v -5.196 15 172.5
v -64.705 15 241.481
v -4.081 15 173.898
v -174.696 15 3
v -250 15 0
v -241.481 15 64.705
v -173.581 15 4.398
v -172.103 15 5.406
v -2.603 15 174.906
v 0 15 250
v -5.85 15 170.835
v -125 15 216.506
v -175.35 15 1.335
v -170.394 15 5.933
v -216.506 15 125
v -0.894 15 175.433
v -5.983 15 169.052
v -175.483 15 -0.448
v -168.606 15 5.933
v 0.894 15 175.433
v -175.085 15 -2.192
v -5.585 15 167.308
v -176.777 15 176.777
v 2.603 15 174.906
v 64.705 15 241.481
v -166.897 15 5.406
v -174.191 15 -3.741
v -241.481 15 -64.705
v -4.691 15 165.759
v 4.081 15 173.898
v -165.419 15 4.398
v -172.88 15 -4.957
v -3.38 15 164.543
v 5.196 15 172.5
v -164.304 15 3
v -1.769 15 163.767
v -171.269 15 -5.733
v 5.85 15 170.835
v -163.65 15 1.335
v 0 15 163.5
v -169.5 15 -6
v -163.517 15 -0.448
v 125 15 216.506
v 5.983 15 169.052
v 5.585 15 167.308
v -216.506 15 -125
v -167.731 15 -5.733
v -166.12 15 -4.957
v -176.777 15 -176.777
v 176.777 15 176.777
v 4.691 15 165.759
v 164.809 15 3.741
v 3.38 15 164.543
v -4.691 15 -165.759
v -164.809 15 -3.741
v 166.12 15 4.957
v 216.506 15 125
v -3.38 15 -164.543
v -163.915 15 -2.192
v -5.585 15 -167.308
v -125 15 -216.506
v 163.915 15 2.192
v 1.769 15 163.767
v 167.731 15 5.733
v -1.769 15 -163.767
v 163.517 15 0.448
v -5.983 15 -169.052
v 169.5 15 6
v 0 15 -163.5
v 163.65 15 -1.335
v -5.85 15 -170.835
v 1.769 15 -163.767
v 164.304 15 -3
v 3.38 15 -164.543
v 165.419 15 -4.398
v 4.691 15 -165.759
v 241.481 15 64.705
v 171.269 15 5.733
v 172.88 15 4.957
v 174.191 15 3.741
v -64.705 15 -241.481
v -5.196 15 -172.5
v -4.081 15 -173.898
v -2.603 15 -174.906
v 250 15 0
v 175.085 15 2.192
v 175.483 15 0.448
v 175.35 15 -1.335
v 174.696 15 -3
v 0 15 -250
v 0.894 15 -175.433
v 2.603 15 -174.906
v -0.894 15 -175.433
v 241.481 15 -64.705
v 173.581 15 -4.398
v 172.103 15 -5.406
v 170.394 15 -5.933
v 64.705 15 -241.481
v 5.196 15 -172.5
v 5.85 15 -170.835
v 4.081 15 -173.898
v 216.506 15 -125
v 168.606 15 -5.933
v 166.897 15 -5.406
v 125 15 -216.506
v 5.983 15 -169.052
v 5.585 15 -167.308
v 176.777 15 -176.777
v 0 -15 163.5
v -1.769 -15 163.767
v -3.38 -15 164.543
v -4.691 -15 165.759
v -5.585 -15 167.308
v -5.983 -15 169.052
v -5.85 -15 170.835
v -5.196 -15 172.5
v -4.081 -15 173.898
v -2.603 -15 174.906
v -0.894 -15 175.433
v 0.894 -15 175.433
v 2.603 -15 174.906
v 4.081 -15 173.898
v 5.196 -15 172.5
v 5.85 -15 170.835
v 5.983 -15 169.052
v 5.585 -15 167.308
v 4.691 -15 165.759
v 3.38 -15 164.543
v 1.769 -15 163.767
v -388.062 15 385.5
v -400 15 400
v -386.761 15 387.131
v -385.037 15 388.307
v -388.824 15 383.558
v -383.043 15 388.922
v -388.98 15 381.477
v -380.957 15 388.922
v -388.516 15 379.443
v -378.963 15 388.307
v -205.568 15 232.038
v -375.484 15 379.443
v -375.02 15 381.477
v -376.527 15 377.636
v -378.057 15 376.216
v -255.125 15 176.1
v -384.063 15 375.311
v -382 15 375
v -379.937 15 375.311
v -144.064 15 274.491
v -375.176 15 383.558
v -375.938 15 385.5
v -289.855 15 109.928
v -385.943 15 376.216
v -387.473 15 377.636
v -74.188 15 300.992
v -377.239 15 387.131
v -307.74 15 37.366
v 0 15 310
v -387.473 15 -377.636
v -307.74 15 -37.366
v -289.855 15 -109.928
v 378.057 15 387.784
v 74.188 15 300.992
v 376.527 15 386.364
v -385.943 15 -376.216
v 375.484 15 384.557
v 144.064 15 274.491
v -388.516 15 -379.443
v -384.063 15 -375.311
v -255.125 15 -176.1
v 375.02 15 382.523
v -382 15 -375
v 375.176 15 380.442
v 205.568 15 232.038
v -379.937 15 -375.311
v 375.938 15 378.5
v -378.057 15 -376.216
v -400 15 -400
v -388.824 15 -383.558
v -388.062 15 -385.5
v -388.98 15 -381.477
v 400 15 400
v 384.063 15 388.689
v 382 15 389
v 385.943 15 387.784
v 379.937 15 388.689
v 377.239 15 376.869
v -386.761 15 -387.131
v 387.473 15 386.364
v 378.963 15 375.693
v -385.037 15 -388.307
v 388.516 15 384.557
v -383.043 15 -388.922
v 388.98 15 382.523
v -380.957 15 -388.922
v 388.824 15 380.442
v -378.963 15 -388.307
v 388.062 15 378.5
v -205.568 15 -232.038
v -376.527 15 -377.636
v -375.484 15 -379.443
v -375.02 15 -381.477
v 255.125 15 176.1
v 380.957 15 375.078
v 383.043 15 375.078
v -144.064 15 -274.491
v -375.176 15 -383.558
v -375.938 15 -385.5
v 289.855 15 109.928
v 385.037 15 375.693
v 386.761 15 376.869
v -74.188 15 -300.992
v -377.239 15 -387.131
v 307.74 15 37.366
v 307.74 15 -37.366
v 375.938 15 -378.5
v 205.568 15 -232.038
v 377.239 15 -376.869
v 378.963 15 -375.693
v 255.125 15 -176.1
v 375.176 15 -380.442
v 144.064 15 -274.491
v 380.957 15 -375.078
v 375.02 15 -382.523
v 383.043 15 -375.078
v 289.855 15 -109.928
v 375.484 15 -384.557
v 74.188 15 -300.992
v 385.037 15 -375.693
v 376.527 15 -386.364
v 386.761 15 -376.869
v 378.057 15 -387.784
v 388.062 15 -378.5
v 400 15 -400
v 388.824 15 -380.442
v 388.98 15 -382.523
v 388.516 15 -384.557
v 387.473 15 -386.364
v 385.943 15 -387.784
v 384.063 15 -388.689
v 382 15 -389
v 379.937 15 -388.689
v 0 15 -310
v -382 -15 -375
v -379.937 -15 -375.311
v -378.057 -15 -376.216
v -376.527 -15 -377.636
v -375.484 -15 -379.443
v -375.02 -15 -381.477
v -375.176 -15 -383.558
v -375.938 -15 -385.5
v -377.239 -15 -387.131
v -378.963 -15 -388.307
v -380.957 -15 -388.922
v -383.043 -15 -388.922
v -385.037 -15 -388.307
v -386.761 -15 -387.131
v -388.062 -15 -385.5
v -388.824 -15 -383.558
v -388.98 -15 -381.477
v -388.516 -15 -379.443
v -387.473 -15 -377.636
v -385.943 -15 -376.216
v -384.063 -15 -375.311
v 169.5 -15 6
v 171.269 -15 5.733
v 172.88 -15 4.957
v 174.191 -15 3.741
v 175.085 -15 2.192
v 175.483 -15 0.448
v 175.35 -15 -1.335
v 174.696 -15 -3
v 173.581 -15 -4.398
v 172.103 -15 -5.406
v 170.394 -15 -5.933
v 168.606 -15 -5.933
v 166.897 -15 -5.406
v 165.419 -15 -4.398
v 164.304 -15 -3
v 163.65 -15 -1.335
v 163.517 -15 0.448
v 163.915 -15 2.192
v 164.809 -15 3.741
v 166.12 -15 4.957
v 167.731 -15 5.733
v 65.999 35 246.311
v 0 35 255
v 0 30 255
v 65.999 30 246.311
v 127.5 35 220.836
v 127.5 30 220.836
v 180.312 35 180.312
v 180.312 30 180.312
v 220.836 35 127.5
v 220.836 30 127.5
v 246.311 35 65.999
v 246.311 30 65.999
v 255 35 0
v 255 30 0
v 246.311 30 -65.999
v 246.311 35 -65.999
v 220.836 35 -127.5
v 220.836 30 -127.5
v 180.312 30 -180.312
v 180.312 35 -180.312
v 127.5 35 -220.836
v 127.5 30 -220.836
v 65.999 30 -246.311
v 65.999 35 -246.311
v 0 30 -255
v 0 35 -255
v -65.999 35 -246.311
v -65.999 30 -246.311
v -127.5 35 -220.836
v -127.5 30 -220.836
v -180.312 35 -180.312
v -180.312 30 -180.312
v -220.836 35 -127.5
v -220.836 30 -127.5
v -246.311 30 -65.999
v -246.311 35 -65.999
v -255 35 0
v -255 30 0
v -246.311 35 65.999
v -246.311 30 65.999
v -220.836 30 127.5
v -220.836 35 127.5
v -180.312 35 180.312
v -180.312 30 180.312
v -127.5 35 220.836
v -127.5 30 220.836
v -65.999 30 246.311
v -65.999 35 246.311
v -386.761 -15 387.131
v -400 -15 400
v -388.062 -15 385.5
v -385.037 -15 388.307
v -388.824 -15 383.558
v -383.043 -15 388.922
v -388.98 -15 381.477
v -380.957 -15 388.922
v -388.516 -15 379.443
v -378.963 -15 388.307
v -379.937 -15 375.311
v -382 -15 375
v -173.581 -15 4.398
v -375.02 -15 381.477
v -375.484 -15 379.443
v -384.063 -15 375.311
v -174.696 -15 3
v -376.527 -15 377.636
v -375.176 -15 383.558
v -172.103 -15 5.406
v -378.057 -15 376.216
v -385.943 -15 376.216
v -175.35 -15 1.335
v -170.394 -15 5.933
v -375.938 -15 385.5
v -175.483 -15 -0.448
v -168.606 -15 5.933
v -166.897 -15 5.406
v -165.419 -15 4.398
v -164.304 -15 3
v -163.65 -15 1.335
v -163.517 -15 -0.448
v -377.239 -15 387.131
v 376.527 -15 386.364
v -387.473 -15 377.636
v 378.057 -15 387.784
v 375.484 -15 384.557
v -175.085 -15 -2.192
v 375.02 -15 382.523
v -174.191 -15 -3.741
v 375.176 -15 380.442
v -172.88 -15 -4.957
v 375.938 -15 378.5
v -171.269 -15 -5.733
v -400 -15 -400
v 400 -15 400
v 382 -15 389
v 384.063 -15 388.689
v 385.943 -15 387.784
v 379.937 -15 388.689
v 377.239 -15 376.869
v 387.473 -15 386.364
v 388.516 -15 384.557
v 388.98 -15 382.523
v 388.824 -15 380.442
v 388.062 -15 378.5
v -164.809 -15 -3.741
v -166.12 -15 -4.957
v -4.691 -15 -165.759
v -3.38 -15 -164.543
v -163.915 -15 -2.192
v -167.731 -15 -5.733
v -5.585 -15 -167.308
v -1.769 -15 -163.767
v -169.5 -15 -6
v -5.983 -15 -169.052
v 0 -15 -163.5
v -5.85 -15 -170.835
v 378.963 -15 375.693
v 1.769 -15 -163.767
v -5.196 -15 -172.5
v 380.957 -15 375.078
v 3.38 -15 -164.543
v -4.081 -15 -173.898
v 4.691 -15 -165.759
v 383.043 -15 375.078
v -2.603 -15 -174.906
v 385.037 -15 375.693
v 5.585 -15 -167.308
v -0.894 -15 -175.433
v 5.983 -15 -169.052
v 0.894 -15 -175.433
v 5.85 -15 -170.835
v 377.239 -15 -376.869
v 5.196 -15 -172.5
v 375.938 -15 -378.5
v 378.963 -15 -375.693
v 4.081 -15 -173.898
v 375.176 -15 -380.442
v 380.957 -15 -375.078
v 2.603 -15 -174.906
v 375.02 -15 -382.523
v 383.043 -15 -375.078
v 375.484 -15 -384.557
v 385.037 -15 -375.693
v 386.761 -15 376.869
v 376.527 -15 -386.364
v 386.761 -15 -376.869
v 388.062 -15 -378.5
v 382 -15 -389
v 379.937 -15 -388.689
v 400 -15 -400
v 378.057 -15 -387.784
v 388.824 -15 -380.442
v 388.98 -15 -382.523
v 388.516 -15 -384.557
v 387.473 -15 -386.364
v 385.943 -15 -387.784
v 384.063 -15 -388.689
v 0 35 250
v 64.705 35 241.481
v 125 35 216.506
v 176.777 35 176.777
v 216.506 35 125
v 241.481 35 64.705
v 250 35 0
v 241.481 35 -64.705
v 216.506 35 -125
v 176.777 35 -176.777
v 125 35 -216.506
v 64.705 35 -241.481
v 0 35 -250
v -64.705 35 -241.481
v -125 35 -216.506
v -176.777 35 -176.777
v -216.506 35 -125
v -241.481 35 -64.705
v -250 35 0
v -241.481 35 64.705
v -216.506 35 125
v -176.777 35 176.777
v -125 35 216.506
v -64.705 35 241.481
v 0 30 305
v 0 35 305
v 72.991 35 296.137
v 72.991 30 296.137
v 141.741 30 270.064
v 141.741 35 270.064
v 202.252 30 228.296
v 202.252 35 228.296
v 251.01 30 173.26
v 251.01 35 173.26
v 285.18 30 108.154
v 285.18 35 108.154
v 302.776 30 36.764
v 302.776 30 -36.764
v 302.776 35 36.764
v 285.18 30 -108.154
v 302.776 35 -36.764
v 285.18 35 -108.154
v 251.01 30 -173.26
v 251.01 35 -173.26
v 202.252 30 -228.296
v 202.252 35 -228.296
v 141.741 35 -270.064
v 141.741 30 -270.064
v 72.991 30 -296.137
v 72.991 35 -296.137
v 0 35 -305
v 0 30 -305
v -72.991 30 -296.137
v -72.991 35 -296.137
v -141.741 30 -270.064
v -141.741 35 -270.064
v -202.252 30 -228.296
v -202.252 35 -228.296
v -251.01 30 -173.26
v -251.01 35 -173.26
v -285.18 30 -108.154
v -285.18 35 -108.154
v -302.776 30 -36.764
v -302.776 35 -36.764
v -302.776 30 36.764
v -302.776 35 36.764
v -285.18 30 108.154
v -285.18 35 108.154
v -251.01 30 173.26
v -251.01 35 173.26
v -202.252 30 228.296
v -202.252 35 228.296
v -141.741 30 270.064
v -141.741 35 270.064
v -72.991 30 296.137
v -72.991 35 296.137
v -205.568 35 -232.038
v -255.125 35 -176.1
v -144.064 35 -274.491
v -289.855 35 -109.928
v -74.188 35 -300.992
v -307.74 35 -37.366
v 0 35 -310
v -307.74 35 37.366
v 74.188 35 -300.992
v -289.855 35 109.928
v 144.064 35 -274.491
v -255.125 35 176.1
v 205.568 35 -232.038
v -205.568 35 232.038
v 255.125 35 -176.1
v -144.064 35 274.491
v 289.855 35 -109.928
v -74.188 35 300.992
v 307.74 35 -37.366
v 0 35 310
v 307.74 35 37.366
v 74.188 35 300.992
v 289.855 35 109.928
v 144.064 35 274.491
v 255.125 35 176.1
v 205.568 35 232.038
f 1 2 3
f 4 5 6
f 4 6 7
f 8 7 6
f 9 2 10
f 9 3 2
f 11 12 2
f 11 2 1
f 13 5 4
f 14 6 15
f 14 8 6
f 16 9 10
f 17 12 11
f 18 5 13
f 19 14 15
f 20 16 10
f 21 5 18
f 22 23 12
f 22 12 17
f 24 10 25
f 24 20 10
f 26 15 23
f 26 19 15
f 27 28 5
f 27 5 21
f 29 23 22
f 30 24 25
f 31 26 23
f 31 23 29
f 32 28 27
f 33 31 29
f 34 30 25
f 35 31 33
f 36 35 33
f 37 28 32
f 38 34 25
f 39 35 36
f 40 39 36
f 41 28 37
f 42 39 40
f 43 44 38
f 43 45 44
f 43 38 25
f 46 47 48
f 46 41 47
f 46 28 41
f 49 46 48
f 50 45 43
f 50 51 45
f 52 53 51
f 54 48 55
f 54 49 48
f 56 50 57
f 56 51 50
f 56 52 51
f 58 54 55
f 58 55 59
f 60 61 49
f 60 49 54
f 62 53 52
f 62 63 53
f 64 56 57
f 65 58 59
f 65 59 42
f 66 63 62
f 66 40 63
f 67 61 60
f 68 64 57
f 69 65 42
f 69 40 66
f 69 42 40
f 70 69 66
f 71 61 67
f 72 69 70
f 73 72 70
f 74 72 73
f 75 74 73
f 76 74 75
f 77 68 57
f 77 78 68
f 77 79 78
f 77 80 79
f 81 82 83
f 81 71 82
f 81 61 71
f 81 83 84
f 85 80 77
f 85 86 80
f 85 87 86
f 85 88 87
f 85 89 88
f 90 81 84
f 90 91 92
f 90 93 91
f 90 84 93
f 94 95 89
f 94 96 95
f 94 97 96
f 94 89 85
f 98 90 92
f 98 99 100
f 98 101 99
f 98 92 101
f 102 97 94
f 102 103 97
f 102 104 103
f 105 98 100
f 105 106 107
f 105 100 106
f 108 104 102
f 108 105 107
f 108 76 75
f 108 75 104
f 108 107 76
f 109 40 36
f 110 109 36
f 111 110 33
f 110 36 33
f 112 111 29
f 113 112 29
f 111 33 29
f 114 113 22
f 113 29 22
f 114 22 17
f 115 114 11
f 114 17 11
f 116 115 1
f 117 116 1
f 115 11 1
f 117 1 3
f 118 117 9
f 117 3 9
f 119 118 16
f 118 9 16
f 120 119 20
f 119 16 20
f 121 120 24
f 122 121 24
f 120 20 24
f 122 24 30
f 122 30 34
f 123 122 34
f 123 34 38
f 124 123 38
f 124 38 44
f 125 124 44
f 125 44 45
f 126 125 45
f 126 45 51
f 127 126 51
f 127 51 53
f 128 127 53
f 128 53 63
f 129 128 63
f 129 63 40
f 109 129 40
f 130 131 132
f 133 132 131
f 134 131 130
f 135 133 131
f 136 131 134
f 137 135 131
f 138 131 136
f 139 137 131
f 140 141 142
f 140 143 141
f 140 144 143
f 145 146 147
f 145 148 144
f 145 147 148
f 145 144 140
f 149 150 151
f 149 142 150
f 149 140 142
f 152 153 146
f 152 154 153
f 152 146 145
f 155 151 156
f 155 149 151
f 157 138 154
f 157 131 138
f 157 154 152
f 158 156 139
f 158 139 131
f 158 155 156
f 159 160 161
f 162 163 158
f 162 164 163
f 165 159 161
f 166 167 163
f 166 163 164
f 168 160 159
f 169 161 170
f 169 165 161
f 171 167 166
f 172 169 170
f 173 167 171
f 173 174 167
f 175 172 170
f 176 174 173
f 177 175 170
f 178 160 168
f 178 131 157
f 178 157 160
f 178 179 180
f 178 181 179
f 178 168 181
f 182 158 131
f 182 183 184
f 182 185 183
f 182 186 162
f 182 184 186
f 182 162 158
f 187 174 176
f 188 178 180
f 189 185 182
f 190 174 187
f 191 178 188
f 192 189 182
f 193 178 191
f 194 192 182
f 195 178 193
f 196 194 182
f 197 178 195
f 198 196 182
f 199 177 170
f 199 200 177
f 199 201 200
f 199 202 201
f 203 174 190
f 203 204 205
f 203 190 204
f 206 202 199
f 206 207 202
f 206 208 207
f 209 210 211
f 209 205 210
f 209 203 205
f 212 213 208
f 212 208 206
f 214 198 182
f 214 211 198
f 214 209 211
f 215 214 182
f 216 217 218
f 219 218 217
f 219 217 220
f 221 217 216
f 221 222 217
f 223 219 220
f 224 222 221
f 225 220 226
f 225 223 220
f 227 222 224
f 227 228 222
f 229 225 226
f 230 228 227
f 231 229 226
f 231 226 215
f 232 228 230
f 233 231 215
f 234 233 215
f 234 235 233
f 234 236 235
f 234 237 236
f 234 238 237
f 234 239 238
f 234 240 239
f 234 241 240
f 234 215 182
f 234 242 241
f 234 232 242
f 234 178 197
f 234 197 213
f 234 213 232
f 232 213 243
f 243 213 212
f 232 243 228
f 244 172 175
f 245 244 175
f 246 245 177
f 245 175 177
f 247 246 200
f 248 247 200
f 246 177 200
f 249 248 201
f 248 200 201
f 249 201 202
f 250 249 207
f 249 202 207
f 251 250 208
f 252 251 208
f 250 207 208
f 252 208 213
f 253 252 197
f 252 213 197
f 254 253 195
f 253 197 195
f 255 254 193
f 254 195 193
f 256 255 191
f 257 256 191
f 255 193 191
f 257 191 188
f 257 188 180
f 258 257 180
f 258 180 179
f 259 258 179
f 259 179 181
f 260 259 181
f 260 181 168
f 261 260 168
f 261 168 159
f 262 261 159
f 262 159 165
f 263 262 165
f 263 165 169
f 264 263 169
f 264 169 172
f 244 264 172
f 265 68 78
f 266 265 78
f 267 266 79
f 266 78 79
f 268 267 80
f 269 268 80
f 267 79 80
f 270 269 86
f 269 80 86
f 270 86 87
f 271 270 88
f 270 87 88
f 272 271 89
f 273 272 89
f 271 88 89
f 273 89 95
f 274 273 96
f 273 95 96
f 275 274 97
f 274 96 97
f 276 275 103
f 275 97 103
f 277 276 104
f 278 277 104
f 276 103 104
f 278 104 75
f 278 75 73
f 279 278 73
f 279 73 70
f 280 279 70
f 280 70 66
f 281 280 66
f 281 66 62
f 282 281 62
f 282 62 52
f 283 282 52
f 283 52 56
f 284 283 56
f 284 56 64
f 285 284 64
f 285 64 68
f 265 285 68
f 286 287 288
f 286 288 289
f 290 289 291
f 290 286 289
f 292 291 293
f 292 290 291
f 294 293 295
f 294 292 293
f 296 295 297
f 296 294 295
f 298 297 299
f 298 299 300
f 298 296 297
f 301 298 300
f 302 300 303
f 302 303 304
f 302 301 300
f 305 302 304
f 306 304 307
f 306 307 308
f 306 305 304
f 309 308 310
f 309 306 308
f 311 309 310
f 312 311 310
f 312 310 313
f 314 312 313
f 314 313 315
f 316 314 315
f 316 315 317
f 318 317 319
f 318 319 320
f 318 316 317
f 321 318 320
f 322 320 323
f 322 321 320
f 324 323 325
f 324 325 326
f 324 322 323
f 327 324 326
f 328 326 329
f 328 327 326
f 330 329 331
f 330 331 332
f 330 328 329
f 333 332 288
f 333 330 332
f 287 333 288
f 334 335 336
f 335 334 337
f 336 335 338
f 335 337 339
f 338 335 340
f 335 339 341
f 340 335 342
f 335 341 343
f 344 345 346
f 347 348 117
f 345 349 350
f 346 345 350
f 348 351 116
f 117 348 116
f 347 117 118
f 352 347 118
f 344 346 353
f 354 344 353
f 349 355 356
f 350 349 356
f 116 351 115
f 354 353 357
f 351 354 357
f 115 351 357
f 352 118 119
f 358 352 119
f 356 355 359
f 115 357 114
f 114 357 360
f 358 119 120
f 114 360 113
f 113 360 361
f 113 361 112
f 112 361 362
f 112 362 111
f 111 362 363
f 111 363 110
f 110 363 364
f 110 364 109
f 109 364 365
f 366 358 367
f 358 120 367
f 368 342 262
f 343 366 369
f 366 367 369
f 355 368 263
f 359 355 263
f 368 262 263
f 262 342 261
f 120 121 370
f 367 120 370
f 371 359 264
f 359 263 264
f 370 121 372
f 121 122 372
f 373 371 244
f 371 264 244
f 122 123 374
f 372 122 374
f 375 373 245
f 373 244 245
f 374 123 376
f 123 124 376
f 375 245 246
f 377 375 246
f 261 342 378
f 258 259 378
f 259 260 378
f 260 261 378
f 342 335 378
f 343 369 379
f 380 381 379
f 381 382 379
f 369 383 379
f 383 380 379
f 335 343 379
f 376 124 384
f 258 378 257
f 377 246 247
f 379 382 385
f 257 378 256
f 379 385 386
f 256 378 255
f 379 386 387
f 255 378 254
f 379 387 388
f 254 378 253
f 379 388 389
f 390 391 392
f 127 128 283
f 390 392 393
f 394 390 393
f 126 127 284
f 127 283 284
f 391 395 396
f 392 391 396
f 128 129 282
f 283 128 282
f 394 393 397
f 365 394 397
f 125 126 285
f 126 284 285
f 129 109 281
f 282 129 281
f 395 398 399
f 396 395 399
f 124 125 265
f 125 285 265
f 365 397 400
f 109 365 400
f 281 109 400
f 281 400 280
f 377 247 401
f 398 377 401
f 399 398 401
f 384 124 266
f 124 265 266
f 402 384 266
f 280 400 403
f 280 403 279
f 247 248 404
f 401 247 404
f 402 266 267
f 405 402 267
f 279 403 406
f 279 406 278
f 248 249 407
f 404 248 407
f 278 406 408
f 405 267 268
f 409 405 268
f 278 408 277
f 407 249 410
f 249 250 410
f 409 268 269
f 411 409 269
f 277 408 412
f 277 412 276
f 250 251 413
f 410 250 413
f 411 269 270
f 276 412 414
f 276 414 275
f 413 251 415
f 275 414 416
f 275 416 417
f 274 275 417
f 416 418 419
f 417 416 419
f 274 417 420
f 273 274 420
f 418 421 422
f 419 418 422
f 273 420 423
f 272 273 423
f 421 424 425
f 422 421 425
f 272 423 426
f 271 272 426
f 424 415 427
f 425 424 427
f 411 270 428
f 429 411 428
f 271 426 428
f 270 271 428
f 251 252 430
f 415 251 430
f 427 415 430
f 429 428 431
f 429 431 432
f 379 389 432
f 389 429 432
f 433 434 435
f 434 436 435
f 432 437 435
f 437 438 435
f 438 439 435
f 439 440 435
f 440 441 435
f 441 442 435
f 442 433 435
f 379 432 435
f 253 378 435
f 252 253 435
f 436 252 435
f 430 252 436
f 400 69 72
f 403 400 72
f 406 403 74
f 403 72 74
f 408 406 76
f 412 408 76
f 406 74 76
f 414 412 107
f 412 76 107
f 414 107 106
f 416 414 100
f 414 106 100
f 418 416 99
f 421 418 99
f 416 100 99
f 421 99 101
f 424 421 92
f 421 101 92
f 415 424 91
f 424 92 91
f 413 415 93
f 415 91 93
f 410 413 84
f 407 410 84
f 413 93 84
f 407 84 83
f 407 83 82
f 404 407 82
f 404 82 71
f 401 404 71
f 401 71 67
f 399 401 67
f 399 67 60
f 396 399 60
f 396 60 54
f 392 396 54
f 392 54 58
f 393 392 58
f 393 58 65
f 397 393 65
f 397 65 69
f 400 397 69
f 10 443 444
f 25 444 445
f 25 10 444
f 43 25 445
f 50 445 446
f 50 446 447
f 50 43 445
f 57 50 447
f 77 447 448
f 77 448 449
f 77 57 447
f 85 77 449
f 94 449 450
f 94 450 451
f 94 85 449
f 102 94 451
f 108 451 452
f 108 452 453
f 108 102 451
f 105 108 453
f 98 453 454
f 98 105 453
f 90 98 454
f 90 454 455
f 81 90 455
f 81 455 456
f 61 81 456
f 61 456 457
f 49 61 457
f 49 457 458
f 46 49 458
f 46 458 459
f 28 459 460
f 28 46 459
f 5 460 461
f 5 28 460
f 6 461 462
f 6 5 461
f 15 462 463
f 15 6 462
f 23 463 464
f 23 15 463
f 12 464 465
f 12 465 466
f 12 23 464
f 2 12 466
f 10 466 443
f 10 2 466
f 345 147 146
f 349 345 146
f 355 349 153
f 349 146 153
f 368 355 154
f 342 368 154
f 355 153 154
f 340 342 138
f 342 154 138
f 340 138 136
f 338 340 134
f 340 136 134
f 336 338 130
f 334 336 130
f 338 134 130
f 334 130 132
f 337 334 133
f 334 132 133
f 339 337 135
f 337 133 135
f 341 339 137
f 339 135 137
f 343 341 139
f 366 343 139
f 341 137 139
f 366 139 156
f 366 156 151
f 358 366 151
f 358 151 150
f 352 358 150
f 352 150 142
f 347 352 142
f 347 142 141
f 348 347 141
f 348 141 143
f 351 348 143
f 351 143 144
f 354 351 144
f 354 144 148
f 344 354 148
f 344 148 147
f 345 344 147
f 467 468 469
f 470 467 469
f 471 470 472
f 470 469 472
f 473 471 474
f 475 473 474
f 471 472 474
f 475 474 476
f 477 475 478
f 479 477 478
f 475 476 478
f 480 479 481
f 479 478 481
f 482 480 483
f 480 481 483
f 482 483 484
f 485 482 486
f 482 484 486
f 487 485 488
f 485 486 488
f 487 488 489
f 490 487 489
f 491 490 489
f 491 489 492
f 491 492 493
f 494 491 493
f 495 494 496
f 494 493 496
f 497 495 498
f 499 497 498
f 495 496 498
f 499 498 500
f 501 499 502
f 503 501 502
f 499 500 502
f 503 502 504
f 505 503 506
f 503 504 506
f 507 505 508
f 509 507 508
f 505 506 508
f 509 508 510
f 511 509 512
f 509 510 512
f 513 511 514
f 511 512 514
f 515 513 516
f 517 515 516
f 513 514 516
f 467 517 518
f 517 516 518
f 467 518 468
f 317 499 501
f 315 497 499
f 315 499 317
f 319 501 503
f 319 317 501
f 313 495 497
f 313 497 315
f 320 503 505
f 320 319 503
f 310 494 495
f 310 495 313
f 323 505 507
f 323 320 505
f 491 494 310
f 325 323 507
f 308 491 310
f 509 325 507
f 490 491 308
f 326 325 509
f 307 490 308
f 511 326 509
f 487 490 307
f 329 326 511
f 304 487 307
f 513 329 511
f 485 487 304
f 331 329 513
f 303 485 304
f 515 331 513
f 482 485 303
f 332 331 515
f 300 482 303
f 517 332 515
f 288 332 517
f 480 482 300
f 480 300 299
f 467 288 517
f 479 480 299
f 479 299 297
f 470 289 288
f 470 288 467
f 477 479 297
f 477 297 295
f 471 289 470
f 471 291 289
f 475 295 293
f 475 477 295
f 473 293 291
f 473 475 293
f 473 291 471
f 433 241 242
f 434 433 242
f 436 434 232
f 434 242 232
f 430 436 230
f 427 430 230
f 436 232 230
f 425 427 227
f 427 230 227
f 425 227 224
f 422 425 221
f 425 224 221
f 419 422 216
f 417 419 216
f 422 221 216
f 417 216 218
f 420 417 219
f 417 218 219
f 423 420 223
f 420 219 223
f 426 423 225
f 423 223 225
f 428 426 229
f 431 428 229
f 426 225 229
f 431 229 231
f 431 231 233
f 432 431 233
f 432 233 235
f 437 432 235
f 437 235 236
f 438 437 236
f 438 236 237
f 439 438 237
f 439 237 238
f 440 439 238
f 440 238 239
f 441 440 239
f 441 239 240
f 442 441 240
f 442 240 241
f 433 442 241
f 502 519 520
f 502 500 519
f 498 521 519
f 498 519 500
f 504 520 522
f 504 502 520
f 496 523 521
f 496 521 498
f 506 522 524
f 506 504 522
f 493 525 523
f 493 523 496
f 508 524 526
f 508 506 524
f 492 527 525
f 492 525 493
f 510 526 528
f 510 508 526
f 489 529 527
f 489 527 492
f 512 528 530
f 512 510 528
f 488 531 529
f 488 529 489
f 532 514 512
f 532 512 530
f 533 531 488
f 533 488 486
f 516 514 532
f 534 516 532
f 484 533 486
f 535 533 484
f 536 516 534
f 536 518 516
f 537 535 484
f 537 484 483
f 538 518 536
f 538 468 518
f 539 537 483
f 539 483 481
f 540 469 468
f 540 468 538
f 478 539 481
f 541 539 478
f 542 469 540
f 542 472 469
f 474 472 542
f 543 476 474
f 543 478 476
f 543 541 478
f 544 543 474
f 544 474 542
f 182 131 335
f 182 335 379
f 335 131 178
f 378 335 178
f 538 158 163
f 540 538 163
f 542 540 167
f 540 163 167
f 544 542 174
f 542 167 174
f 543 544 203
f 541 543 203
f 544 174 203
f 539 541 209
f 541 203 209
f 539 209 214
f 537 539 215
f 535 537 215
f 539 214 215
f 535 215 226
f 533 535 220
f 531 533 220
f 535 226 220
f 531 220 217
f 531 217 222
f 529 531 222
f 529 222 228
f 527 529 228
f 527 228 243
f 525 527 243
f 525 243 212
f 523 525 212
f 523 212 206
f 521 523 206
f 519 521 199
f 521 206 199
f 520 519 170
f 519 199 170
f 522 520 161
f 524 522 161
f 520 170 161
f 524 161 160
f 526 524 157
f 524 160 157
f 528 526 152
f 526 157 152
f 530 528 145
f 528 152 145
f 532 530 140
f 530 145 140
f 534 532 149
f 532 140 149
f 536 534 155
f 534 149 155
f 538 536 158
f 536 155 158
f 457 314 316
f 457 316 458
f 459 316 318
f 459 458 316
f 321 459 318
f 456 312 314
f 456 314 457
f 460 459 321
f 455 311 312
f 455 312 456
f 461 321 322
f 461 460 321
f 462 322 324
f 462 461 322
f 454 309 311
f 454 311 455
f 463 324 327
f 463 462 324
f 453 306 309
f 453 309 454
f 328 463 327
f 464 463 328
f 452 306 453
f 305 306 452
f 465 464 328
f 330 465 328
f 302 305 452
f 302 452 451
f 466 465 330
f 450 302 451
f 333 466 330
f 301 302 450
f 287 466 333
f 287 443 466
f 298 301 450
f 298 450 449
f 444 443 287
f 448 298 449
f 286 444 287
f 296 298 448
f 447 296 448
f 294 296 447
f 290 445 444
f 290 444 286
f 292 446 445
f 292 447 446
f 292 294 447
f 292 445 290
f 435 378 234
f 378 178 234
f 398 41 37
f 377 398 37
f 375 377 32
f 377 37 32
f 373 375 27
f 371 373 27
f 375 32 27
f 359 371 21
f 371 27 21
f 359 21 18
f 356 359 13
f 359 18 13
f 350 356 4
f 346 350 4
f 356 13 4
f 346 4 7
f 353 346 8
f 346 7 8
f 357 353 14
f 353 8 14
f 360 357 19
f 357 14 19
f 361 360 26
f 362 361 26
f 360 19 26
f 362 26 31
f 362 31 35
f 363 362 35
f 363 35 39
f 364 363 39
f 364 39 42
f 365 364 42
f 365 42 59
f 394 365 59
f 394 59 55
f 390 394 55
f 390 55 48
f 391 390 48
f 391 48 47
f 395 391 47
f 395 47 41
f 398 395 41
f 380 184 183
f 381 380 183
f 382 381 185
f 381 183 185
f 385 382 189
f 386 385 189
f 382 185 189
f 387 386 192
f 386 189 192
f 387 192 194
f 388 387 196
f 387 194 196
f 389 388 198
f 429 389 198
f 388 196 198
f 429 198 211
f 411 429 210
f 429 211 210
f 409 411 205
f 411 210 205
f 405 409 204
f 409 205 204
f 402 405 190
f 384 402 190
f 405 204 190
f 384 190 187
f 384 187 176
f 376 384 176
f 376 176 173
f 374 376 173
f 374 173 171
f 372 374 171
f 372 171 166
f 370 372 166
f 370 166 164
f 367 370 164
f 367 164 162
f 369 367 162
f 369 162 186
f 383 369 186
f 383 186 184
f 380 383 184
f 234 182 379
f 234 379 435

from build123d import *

# Parameters (mm, degrees)
SKETCH1_W           = 800
SKETCH1_H           = 800
BOSS_EXTRUDE1_DEPTH = 15
SKETCH4_R           = 6
CUT_EXTRUDE3_DEPTH  = 567.480361531
SKETCH3_R           = 310
SKETCH3_R_2         = 250
BOSS_EXTRUDE2_DEPTH = 20
SKETCH5_R           = 305
SKETCH5_R_2         = 255
CUT_EXTRUDE4_DEPTH  = 5
SKETCH6_R           = 7
CUT_EXTRUDE5_DEPTH  = 567.480361531


with BuildPart() as part:
    # Sketch1 → Boss-Extrude1 (new, symmetric)
    with BuildSketch(Plane(origin=(0, 0, 0), x_dir=(1, 0, 0), z_dir=(0, 1, 0))):
        Rectangle(SKETCH1_W, SKETCH1_H)
    extrude(amount=BOSS_EXTRUDE1_DEPTH, both=True)

    # Sketch4 → Cut-Extrude3 (cut, through all)
    with BuildSketch(Plane(origin=(0, 15, 0), x_dir=(1, 0, 0), z_dir=(0, 1, 0))):
        with Locations(Location((0, 169.5, 0), (0, 0, 270))):
            Circle(SKETCH4_R)
        with Locations(Location((169.5, 0, 0), (0, 0, 270))):
            Circle(SKETCH4_R)
        with Locations(Location((0, -169.5, 0), (0, 0, 90))):
            Circle(SKETCH4_R)
        with Locations(Location((-169.5, 0, 0), (0, 0, 90))):
            Circle(SKETCH4_R)
    extrude(amount=-CUT_EXTRUDE3_DEPTH, mode=Mode.SUBTRACT)

    # Sketch3 → Boss-Extrude2 (add)
    with BuildSketch(Plane(origin=(0, 15, 0), x_dir=(1, 0, 0), z_dir=(0, 1, 0))):
        with Locations(Location((0, 0, 0), (0, 0, 270))):
            Circle(SKETCH3_R)
        with Locations(Location((0, 0, 0), (0, 0, 270))):
            Circle(SKETCH3_R_2, mode=Mode.SUBTRACT)
    extrude(amount=BOSS_EXTRUDE2_DEPTH)

    # Sketch5 → Cut-Extrude4 (cut)
    with BuildSketch(Plane(origin=(0, 35, 0), x_dir=(1, 0, 0), z_dir=(0, 1, 0))):
        with Locations(Location((0, 0, 0), (0, 0, 270))):
            Circle(SKETCH5_R)
        with Locations(Location((0, 0, 0), (0, 0, 270))):
            Circle(SKETCH5_R_2, mode=Mode.SUBTRACT)
    extrude(amount=-CUT_EXTRUDE4_DEPTH, mode=Mode.SUBTRACT)

    # Sketch6 → Cut-Extrude5 (cut, through all)
    with BuildSketch(Plane(origin=(0, 15, 0), x_dir=(1, 0, 0), z_dir=(0, 1, 0))):
        with Locations(Location((-382, 382, 0), (0, 0, 270))):
            Circle(SKETCH6_R)
        with Locations(Location((382, 382, 0), (0, 0, 90))):
            Circle(SKETCH6_R)
        with Locations(Location((382, -382, 0), (0, 0, 270))):
            Circle(SKETCH6_R)
        with Locations(Location((-382, -382, 0), (0, 0, 90))):
            Circle(SKETCH6_R)
    extrude(amount=-CUT_EXTRUDE5_DEPTH, mode=Mode.SUBTRACT)


solid = part.part
